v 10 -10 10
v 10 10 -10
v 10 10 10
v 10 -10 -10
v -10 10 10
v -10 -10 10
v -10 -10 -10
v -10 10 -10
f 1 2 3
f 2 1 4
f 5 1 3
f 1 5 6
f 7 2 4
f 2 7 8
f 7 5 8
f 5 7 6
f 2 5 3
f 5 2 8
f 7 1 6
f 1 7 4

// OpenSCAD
// Calibration cube — 20mm on each side
// Use this to verify printer dimensional accuracy

$fn = 32;

difference() {
    cube([20, 20, 20], center=true);

    // X-axis label
    translate([0, -10.5, 0])
        rotate([90, 0, 0])
            linear_extrude(1)
                text("X", size=8, halign="center", valign="center");

    // Y-axis label
    translate([10.5, 0, 0])
        rotate([90, 0, 90])
            linear_extrude(1)
                text("Y", size=8, halign="center", valign="center");

    // Z-axis label
    translate([0, 0, 10.5])
        linear_extrude(1)
            text("Z", size=8, halign="center", valign="center");
}
